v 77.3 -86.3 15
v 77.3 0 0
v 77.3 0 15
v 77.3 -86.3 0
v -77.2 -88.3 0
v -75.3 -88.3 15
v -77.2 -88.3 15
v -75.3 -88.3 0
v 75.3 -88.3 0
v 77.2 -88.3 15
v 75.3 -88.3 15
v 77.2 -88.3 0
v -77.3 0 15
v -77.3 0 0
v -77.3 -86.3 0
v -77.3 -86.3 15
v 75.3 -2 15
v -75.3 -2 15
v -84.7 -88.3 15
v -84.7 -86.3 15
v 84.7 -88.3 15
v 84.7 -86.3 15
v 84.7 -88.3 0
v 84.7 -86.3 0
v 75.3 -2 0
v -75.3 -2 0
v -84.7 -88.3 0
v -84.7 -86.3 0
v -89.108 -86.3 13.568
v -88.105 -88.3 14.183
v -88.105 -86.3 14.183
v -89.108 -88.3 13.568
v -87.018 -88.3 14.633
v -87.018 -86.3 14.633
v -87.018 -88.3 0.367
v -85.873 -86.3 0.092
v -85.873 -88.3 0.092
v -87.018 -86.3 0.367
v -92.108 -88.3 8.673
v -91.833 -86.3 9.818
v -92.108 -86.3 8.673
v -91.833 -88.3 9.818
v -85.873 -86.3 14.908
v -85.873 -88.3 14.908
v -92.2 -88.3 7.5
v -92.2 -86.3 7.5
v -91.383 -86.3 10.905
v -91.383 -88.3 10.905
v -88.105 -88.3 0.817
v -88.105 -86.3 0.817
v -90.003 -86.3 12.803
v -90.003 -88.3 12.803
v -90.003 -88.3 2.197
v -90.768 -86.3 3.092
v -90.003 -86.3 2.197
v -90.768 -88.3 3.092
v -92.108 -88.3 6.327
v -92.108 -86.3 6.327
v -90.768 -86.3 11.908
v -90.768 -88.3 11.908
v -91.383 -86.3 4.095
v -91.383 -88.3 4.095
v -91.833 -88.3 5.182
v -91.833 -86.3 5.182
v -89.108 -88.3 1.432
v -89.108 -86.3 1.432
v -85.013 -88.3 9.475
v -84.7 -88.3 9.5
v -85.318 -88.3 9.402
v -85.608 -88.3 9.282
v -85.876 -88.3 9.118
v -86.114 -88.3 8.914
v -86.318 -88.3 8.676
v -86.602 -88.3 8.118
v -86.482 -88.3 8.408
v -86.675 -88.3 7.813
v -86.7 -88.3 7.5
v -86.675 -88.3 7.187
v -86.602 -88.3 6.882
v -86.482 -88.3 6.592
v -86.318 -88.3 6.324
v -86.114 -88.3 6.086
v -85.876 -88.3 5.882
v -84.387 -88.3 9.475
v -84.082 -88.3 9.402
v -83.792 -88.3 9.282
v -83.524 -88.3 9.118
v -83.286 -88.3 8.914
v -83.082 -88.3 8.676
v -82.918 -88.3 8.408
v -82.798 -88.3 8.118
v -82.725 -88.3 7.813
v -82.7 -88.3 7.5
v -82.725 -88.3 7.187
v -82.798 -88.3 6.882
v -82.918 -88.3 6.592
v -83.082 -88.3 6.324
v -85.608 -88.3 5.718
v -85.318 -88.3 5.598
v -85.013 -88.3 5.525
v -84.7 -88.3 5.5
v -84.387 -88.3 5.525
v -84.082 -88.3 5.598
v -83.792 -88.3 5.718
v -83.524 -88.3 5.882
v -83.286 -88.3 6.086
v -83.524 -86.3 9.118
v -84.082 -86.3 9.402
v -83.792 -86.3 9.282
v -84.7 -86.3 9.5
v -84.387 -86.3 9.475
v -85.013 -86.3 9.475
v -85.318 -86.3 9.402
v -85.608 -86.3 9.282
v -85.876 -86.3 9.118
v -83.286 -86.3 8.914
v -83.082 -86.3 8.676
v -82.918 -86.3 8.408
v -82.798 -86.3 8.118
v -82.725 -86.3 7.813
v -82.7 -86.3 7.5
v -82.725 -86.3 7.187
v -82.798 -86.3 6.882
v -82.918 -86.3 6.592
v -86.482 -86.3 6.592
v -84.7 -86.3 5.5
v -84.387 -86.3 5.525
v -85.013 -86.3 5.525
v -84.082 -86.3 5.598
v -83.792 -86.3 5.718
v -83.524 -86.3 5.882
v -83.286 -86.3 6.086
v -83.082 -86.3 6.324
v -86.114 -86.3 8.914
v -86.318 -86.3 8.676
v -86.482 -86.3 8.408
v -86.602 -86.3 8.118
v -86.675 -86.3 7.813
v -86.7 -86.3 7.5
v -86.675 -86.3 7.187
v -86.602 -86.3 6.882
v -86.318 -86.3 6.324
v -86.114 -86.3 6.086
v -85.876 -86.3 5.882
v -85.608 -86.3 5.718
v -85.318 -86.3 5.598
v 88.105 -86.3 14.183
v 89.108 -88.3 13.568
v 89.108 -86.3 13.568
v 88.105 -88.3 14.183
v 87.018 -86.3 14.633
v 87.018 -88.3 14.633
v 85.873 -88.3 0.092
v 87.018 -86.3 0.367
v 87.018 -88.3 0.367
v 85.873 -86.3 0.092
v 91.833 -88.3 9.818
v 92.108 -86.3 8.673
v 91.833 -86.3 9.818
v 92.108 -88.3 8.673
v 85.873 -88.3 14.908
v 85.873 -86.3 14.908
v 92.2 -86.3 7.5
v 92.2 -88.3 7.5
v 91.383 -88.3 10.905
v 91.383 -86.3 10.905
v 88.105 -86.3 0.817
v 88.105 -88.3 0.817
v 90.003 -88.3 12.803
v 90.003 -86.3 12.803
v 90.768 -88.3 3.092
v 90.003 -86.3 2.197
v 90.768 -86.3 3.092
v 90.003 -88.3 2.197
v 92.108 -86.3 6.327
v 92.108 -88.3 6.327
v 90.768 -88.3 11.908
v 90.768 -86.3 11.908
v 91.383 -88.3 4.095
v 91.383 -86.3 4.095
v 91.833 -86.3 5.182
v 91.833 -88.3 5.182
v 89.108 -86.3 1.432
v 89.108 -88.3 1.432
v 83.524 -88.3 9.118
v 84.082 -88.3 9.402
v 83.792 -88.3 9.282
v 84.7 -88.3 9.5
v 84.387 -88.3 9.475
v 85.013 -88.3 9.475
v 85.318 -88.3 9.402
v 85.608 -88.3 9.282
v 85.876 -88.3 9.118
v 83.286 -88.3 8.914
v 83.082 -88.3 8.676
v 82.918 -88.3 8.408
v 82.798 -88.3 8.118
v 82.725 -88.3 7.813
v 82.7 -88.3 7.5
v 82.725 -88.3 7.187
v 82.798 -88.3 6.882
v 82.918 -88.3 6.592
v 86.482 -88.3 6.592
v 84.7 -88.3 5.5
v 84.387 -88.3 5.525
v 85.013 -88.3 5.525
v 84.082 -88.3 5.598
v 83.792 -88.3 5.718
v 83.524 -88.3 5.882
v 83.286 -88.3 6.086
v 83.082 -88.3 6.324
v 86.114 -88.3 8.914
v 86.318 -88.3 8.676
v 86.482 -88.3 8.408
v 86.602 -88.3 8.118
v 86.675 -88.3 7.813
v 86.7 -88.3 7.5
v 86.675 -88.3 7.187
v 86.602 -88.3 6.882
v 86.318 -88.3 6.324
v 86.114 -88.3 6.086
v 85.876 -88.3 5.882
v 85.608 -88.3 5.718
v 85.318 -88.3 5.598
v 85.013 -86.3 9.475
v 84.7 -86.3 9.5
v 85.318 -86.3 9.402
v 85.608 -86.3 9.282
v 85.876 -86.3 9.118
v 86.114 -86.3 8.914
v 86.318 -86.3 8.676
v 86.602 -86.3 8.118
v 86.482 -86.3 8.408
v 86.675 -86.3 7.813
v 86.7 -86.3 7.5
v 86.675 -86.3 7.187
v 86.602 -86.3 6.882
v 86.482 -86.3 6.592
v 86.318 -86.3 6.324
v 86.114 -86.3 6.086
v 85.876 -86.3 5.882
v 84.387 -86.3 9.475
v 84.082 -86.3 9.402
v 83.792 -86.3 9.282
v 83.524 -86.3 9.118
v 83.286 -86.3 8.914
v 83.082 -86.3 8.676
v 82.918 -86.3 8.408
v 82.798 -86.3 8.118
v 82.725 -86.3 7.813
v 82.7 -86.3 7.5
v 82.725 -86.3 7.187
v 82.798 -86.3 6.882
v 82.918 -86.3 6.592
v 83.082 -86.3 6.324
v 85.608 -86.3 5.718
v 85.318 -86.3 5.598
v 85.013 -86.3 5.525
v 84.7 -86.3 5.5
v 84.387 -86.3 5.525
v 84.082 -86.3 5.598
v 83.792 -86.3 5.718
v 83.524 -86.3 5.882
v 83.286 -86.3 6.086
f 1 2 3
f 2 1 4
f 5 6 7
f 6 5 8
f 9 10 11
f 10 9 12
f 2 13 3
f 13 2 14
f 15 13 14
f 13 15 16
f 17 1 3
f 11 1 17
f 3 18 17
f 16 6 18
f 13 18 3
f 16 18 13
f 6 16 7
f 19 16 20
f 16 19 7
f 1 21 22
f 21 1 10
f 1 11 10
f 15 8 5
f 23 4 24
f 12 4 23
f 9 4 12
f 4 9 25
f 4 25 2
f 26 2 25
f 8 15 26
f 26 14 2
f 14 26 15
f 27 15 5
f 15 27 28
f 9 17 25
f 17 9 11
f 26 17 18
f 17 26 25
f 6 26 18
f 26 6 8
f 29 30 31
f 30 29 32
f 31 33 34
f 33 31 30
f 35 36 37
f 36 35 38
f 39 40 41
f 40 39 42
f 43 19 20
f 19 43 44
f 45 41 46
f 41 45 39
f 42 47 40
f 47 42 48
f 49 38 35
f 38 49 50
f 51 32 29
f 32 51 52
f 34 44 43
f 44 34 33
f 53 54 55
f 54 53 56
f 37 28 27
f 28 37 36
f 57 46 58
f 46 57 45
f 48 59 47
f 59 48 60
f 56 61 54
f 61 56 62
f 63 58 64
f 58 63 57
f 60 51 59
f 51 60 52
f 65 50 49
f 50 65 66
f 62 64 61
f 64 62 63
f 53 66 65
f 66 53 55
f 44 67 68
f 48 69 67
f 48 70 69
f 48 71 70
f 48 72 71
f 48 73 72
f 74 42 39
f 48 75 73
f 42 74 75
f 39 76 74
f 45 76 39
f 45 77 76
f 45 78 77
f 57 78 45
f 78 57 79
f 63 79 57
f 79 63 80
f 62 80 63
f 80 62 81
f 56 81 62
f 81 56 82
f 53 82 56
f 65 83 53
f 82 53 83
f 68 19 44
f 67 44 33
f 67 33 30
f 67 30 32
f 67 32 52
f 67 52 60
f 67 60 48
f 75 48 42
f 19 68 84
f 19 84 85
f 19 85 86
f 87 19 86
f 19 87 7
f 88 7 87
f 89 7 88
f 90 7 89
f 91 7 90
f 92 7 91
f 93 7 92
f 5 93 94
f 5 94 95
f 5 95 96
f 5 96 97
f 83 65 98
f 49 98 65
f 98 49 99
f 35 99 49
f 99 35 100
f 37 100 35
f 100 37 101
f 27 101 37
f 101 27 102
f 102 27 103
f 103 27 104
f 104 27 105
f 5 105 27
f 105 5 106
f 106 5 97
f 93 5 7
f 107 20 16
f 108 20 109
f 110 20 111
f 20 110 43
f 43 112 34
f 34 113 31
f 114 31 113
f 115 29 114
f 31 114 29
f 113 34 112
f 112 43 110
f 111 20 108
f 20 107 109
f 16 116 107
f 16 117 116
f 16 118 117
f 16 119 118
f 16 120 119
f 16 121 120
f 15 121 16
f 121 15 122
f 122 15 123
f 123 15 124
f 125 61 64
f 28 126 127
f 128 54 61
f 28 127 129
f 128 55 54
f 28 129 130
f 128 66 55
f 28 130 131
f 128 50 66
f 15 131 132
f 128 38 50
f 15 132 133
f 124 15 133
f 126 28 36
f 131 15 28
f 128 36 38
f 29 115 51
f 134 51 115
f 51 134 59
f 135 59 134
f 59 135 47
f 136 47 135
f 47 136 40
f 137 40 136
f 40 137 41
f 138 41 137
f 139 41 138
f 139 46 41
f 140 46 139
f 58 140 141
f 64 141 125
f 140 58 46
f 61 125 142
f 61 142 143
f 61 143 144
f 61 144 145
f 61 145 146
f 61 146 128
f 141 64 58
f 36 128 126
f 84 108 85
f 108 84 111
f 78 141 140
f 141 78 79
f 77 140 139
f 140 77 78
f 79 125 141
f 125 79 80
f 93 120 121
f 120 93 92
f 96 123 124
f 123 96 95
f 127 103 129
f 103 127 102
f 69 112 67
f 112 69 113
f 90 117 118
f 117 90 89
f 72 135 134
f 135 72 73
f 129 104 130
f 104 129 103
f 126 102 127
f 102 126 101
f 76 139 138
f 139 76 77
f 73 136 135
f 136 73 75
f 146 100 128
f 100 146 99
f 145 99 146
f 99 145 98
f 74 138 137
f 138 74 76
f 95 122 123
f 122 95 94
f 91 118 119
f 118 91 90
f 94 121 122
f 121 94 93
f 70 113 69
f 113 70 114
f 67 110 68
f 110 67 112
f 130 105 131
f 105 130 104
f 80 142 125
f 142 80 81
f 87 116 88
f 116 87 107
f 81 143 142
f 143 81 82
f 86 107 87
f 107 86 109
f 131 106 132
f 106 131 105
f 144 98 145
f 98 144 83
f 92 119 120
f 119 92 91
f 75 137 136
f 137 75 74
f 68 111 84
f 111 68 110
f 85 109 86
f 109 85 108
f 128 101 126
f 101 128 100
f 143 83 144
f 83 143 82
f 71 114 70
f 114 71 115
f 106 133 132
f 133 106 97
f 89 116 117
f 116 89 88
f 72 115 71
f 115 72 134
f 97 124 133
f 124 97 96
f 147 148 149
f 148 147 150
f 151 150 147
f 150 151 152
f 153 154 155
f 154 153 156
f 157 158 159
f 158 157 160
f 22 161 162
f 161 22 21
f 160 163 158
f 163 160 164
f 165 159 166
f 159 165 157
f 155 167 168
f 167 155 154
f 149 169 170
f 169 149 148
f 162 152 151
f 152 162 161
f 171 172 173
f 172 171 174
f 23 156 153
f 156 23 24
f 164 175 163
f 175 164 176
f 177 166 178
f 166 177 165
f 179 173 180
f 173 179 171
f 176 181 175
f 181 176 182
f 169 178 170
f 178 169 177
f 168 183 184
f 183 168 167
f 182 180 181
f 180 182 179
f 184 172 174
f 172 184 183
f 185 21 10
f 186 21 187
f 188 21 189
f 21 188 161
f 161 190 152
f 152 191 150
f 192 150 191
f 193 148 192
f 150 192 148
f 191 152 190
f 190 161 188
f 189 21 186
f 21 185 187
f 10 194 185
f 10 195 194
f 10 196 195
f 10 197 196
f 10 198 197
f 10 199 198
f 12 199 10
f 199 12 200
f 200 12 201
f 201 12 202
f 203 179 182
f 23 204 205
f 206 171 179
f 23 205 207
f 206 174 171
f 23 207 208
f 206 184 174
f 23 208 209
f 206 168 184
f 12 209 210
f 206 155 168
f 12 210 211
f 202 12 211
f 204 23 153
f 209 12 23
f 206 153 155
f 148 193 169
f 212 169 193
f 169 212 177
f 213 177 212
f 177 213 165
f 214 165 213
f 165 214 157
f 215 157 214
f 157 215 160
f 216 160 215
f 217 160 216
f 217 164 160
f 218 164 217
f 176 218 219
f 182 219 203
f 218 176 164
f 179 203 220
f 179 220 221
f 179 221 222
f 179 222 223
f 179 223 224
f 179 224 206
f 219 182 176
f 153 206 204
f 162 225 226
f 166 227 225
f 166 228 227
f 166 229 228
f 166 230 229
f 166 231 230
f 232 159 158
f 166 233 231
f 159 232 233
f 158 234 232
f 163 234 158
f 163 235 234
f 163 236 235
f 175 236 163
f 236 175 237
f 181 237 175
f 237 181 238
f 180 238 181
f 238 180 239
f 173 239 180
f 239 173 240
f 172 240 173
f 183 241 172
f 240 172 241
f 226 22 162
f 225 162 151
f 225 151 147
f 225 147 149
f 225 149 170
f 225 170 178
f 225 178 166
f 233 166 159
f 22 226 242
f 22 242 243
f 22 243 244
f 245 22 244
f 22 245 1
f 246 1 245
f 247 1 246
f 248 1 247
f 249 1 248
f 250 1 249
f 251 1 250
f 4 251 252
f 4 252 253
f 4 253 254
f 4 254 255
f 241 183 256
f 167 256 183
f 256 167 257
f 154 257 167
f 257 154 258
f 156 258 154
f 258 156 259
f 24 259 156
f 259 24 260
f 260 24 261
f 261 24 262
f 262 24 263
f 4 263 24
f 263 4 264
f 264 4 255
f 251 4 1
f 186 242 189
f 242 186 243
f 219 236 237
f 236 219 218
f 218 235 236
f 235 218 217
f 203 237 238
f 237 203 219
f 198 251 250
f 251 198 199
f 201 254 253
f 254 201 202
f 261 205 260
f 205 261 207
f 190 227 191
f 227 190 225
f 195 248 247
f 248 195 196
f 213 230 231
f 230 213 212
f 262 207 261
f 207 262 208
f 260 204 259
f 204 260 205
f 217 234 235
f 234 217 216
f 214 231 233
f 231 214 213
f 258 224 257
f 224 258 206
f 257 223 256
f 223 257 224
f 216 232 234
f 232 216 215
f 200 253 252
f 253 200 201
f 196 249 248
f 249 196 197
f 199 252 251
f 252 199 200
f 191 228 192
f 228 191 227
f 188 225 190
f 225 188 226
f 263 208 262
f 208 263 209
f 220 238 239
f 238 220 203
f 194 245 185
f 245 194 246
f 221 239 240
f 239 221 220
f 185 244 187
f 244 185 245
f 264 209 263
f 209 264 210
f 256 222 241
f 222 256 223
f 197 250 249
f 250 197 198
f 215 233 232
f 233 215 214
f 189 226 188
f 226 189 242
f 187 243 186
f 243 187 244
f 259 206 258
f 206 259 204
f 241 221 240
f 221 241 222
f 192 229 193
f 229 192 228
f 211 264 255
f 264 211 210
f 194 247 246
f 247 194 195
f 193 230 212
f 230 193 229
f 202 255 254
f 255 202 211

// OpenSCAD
// file: common.scad
atx_psu_width = 150;
atx_psu_height = 86;

card_spacing = 20.32;

module mock_mobo() {
    $fn=50;
    difference() {
        cube([350, 193, 2]);
        translate([350-16.5,10,0]) cylinder(d=4, h=3);
        translate([350-16.5,193-27.7,0]) cylinder(d=4, h=3);

        translate([350-95.2,10,0]) cylinder(d=4, h=3);

        translate([350-141,10,0]) cylinder(d=4, h=3);
        translate([350-141,193-27.7,0]) cylinder(d=4, h=3);

        translate([6.3,33.2,0]) cylinder(d=4, h=3);
        translate([6.3,193-27.7,0]) cylinder(d=4, h=3);
    }
}

module mock_card() {
    $fn=50;
    cube([200, 2, 106.7]);
    translate([-12.3, -15.8+22-19.4, -18.8+119.2]) difference() {
        cube([12.3,19.4,1]);
        translate([6.3, 19.4-1-4.8/2,0]) hull() {
            cylinder(d=4.8,h=2, $fn=40);
            translate([0,5,0]) cylinder(d=4.8,h=2, $fn=40);
        }
    }
    difference() {
        translate([-1,-15.8, -18.8]) cube([1,22, 120.2]);
        translate([-1.3,-15.8, -18.8]) cube([2,(18.8-10.6)/2, 11.2]);
        translate([-1.3,-15.8+10.6+(18.8-10.6)/2, -18.8]) cube([2,(18.8-10.6)/2, 11.2]);
        translate([-1.3,-15.8+18.8, -18.8]) cube([2,5, 116.2]);
        translate([-1.3,-15.8, -18.8+116.2]) cube([2,22-18.8, 5]);
    }
    
}

module mock_mobo_card() {
    
    mock_mobo();
    translate([350-142,-1.2,18.8-10.4]) rotate([0,0,90]) mock_card();
    translate([350-142+card_spacing,-1.2,18.8-10.4]) rotate([0,0,90]) mock_card();
    translate([350-142+2*card_spacing,-1.2,18.8-10.4]) rotate([0,0,90]) mock_card();
    translate([350-142+3*card_spacing,-1.2,18.8-10.4]) rotate([0,0,90]) mock_card();
    translate([350-142+4*card_spacing,-1.2,18.8-10.4]) rotate([0,0,90]) mock_card();
    translate([350-142+5*card_spacing,-1.2,18.8-10.4]) rotate([0,0,90]) mock_card();
    translate([350-142+6*card_spacing,-1.2,18.8-10.4]) rotate([0,0,90]) mock_card();
}

module mock_ssd() {
    difference() {
        cube([70, 100, 7.1]);
        translate([9.4,0,6.5]) cube([41.4,7,1]);
        translate([10.4,0,0]) cube([39.4,7,2]);
    }
    translate([0,13.6,3]) rotate([0,-90,0]) cylinder(d=2.5, h=5, $fn=30);
    translate([0,100-9.2,3]) rotate([0,-90,0]) cylinder(d=2.5, h=5, $fn=30);

    translate([70+5,13.6,3]) rotate([0,-90,0]) cylinder(d=2.5, h=5, $fn=30);
    translate([70+5,100-9.2,3]) rotate([0,-90,0]) cylinder(d=2.5, h=5, $fn=30);

}


hd_width = 102;
hd_height = 26.1;

screw_dia = 3.6;

module mock_hd() {
    color("white") difference() {
        cube([hd_width,146,26]);
        translate([0,28.3,6.40]) rotate([0,90,0]) cylinder(d=screw_dia, h=5, $fn=30);
        translate([0,69.8,6.40]) rotate([0,90,0]) cylinder(d=screw_dia, h=5, $fn=30);
        translate([0,129.8,6.40]) rotate([0,90,0]) cylinder(d=screw_dia, h=5, $fn=30);

        translate([hd_width-5,28.3,6.40]) rotate([0,90,0]) cylinder(d=screw_dia, h=5, $fn=30);
        translate([hd_width-5,69.8,6.40]) rotate([0,90,0]) cylinder(d=screw_dia, h=5, $fn=30);
        translate([hd_width-5,129.8,6.40]) rotate([0,90,0]) cylinder(d=screw_dia, h=5, $fn=30);

    }
        
}

module minus_atx_psu_holes(hole=3.2) {
    difference() {
        children();
        translate([-138/2,0,6]) rotate([-90,0,0]) cylinder(d=hole, h=5, $fn=30);
        translate([138/2,0,6]) rotate([-90,0,0]) cylinder(d=hole, h=5, $fn=30);
        translate([138/2,0,6+64]) rotate([-90,0,0]) cylinder(d=hole, h=5, $fn=30);
        translate([-150/2+30,0,atx_psu_height-6]) rotate([-90,0,0]) cylinder(d=hole, h=5, $fn=30);
    }
}

module mock_atx_psu(holes=true, slop=0) {
    w = atx_psu_width+2*slop;
    h = atx_psu_height+2*slop;
    if (holes) {
        minus_atx_psu_holes() {
            translate([-w/2,0,0]) cube([w, 140, h]);
        }
    } else {
        translate([-w/2,0,0]) cube([w, 140, h]);
    }
}

//mock_mobo();
//mock_card();
//mock_mobo_card();
//mock_ssd();
//mock_atx_psu();
// main file
include <common.scad>;
wall = 2;
slop = 0.3;
w = atx_psu_width + 2*wall + 2*slop;
h = atx_psu_height + wall + slop;

module _plate(ears=true) {
    
    module ear() {
        difference() {
            hull() {
                cube([1, wall, 15]);
                translate([15/2,0,15/2]) rotate([-90,0,0]) cylinder(d=15,h=wall, $fn=40);
            }
            translate([15/2,0,15/2]) rotate([-90,0,0]) cylinder(d=4,h=5, $fn=40);
        }
    }
    
    union() {
        rotate([90,0,0]) difference() {
            translate([0,0,wall]) minus_atx_psu_holes() {
                translate([-w/2,0,-wall]) cube([w, 15, h]);
            }
            if (ears) {
                translate([0,wall,wall]) mock_atx_psu(holes=false, slop=slop);
                translate([0,0,wall]) difference() {
                    minus_atx_psu_holes(hole=8) {
                        translate([-(atx_psu_width+2*slop)/2,0,0]) {
                            cube([atx_psu_width+2*slop,wall+1,atx_psu_height+slop]);
                        }
                    }
                    translate([-(atx_psu_width+2*slop)/2,0,0]) cube([6,wall+1,8+2]);
                    translate([-(atx_psu_width+2*slop)/2,0,atx_psu_height-6-8/2]) cube([30,wall+1,8]);
                    translate([(atx_psu_width+2*slop)/2-6,0,6-8/2+64]) cube([6,wall+1,8]);
                    translate([(atx_psu_width+2*slop)/2-6,0,0]) cube([6,wall+1,8+2]);
                }
            } else {
                translate([0,0,wall]) mock_atx_psu(holes=false, slop=slop);
            }
        }
        
        translate([-w/2+0.1,-h,0]) mirror([1,0,0]) ear();
        translate([w/2-0.1,-h,0]) ear();
    }
    
}

module back_plate() {
    _plate();
}

module front_plate() {
    _plate(false);
}

//back_plate();
front_plate();
